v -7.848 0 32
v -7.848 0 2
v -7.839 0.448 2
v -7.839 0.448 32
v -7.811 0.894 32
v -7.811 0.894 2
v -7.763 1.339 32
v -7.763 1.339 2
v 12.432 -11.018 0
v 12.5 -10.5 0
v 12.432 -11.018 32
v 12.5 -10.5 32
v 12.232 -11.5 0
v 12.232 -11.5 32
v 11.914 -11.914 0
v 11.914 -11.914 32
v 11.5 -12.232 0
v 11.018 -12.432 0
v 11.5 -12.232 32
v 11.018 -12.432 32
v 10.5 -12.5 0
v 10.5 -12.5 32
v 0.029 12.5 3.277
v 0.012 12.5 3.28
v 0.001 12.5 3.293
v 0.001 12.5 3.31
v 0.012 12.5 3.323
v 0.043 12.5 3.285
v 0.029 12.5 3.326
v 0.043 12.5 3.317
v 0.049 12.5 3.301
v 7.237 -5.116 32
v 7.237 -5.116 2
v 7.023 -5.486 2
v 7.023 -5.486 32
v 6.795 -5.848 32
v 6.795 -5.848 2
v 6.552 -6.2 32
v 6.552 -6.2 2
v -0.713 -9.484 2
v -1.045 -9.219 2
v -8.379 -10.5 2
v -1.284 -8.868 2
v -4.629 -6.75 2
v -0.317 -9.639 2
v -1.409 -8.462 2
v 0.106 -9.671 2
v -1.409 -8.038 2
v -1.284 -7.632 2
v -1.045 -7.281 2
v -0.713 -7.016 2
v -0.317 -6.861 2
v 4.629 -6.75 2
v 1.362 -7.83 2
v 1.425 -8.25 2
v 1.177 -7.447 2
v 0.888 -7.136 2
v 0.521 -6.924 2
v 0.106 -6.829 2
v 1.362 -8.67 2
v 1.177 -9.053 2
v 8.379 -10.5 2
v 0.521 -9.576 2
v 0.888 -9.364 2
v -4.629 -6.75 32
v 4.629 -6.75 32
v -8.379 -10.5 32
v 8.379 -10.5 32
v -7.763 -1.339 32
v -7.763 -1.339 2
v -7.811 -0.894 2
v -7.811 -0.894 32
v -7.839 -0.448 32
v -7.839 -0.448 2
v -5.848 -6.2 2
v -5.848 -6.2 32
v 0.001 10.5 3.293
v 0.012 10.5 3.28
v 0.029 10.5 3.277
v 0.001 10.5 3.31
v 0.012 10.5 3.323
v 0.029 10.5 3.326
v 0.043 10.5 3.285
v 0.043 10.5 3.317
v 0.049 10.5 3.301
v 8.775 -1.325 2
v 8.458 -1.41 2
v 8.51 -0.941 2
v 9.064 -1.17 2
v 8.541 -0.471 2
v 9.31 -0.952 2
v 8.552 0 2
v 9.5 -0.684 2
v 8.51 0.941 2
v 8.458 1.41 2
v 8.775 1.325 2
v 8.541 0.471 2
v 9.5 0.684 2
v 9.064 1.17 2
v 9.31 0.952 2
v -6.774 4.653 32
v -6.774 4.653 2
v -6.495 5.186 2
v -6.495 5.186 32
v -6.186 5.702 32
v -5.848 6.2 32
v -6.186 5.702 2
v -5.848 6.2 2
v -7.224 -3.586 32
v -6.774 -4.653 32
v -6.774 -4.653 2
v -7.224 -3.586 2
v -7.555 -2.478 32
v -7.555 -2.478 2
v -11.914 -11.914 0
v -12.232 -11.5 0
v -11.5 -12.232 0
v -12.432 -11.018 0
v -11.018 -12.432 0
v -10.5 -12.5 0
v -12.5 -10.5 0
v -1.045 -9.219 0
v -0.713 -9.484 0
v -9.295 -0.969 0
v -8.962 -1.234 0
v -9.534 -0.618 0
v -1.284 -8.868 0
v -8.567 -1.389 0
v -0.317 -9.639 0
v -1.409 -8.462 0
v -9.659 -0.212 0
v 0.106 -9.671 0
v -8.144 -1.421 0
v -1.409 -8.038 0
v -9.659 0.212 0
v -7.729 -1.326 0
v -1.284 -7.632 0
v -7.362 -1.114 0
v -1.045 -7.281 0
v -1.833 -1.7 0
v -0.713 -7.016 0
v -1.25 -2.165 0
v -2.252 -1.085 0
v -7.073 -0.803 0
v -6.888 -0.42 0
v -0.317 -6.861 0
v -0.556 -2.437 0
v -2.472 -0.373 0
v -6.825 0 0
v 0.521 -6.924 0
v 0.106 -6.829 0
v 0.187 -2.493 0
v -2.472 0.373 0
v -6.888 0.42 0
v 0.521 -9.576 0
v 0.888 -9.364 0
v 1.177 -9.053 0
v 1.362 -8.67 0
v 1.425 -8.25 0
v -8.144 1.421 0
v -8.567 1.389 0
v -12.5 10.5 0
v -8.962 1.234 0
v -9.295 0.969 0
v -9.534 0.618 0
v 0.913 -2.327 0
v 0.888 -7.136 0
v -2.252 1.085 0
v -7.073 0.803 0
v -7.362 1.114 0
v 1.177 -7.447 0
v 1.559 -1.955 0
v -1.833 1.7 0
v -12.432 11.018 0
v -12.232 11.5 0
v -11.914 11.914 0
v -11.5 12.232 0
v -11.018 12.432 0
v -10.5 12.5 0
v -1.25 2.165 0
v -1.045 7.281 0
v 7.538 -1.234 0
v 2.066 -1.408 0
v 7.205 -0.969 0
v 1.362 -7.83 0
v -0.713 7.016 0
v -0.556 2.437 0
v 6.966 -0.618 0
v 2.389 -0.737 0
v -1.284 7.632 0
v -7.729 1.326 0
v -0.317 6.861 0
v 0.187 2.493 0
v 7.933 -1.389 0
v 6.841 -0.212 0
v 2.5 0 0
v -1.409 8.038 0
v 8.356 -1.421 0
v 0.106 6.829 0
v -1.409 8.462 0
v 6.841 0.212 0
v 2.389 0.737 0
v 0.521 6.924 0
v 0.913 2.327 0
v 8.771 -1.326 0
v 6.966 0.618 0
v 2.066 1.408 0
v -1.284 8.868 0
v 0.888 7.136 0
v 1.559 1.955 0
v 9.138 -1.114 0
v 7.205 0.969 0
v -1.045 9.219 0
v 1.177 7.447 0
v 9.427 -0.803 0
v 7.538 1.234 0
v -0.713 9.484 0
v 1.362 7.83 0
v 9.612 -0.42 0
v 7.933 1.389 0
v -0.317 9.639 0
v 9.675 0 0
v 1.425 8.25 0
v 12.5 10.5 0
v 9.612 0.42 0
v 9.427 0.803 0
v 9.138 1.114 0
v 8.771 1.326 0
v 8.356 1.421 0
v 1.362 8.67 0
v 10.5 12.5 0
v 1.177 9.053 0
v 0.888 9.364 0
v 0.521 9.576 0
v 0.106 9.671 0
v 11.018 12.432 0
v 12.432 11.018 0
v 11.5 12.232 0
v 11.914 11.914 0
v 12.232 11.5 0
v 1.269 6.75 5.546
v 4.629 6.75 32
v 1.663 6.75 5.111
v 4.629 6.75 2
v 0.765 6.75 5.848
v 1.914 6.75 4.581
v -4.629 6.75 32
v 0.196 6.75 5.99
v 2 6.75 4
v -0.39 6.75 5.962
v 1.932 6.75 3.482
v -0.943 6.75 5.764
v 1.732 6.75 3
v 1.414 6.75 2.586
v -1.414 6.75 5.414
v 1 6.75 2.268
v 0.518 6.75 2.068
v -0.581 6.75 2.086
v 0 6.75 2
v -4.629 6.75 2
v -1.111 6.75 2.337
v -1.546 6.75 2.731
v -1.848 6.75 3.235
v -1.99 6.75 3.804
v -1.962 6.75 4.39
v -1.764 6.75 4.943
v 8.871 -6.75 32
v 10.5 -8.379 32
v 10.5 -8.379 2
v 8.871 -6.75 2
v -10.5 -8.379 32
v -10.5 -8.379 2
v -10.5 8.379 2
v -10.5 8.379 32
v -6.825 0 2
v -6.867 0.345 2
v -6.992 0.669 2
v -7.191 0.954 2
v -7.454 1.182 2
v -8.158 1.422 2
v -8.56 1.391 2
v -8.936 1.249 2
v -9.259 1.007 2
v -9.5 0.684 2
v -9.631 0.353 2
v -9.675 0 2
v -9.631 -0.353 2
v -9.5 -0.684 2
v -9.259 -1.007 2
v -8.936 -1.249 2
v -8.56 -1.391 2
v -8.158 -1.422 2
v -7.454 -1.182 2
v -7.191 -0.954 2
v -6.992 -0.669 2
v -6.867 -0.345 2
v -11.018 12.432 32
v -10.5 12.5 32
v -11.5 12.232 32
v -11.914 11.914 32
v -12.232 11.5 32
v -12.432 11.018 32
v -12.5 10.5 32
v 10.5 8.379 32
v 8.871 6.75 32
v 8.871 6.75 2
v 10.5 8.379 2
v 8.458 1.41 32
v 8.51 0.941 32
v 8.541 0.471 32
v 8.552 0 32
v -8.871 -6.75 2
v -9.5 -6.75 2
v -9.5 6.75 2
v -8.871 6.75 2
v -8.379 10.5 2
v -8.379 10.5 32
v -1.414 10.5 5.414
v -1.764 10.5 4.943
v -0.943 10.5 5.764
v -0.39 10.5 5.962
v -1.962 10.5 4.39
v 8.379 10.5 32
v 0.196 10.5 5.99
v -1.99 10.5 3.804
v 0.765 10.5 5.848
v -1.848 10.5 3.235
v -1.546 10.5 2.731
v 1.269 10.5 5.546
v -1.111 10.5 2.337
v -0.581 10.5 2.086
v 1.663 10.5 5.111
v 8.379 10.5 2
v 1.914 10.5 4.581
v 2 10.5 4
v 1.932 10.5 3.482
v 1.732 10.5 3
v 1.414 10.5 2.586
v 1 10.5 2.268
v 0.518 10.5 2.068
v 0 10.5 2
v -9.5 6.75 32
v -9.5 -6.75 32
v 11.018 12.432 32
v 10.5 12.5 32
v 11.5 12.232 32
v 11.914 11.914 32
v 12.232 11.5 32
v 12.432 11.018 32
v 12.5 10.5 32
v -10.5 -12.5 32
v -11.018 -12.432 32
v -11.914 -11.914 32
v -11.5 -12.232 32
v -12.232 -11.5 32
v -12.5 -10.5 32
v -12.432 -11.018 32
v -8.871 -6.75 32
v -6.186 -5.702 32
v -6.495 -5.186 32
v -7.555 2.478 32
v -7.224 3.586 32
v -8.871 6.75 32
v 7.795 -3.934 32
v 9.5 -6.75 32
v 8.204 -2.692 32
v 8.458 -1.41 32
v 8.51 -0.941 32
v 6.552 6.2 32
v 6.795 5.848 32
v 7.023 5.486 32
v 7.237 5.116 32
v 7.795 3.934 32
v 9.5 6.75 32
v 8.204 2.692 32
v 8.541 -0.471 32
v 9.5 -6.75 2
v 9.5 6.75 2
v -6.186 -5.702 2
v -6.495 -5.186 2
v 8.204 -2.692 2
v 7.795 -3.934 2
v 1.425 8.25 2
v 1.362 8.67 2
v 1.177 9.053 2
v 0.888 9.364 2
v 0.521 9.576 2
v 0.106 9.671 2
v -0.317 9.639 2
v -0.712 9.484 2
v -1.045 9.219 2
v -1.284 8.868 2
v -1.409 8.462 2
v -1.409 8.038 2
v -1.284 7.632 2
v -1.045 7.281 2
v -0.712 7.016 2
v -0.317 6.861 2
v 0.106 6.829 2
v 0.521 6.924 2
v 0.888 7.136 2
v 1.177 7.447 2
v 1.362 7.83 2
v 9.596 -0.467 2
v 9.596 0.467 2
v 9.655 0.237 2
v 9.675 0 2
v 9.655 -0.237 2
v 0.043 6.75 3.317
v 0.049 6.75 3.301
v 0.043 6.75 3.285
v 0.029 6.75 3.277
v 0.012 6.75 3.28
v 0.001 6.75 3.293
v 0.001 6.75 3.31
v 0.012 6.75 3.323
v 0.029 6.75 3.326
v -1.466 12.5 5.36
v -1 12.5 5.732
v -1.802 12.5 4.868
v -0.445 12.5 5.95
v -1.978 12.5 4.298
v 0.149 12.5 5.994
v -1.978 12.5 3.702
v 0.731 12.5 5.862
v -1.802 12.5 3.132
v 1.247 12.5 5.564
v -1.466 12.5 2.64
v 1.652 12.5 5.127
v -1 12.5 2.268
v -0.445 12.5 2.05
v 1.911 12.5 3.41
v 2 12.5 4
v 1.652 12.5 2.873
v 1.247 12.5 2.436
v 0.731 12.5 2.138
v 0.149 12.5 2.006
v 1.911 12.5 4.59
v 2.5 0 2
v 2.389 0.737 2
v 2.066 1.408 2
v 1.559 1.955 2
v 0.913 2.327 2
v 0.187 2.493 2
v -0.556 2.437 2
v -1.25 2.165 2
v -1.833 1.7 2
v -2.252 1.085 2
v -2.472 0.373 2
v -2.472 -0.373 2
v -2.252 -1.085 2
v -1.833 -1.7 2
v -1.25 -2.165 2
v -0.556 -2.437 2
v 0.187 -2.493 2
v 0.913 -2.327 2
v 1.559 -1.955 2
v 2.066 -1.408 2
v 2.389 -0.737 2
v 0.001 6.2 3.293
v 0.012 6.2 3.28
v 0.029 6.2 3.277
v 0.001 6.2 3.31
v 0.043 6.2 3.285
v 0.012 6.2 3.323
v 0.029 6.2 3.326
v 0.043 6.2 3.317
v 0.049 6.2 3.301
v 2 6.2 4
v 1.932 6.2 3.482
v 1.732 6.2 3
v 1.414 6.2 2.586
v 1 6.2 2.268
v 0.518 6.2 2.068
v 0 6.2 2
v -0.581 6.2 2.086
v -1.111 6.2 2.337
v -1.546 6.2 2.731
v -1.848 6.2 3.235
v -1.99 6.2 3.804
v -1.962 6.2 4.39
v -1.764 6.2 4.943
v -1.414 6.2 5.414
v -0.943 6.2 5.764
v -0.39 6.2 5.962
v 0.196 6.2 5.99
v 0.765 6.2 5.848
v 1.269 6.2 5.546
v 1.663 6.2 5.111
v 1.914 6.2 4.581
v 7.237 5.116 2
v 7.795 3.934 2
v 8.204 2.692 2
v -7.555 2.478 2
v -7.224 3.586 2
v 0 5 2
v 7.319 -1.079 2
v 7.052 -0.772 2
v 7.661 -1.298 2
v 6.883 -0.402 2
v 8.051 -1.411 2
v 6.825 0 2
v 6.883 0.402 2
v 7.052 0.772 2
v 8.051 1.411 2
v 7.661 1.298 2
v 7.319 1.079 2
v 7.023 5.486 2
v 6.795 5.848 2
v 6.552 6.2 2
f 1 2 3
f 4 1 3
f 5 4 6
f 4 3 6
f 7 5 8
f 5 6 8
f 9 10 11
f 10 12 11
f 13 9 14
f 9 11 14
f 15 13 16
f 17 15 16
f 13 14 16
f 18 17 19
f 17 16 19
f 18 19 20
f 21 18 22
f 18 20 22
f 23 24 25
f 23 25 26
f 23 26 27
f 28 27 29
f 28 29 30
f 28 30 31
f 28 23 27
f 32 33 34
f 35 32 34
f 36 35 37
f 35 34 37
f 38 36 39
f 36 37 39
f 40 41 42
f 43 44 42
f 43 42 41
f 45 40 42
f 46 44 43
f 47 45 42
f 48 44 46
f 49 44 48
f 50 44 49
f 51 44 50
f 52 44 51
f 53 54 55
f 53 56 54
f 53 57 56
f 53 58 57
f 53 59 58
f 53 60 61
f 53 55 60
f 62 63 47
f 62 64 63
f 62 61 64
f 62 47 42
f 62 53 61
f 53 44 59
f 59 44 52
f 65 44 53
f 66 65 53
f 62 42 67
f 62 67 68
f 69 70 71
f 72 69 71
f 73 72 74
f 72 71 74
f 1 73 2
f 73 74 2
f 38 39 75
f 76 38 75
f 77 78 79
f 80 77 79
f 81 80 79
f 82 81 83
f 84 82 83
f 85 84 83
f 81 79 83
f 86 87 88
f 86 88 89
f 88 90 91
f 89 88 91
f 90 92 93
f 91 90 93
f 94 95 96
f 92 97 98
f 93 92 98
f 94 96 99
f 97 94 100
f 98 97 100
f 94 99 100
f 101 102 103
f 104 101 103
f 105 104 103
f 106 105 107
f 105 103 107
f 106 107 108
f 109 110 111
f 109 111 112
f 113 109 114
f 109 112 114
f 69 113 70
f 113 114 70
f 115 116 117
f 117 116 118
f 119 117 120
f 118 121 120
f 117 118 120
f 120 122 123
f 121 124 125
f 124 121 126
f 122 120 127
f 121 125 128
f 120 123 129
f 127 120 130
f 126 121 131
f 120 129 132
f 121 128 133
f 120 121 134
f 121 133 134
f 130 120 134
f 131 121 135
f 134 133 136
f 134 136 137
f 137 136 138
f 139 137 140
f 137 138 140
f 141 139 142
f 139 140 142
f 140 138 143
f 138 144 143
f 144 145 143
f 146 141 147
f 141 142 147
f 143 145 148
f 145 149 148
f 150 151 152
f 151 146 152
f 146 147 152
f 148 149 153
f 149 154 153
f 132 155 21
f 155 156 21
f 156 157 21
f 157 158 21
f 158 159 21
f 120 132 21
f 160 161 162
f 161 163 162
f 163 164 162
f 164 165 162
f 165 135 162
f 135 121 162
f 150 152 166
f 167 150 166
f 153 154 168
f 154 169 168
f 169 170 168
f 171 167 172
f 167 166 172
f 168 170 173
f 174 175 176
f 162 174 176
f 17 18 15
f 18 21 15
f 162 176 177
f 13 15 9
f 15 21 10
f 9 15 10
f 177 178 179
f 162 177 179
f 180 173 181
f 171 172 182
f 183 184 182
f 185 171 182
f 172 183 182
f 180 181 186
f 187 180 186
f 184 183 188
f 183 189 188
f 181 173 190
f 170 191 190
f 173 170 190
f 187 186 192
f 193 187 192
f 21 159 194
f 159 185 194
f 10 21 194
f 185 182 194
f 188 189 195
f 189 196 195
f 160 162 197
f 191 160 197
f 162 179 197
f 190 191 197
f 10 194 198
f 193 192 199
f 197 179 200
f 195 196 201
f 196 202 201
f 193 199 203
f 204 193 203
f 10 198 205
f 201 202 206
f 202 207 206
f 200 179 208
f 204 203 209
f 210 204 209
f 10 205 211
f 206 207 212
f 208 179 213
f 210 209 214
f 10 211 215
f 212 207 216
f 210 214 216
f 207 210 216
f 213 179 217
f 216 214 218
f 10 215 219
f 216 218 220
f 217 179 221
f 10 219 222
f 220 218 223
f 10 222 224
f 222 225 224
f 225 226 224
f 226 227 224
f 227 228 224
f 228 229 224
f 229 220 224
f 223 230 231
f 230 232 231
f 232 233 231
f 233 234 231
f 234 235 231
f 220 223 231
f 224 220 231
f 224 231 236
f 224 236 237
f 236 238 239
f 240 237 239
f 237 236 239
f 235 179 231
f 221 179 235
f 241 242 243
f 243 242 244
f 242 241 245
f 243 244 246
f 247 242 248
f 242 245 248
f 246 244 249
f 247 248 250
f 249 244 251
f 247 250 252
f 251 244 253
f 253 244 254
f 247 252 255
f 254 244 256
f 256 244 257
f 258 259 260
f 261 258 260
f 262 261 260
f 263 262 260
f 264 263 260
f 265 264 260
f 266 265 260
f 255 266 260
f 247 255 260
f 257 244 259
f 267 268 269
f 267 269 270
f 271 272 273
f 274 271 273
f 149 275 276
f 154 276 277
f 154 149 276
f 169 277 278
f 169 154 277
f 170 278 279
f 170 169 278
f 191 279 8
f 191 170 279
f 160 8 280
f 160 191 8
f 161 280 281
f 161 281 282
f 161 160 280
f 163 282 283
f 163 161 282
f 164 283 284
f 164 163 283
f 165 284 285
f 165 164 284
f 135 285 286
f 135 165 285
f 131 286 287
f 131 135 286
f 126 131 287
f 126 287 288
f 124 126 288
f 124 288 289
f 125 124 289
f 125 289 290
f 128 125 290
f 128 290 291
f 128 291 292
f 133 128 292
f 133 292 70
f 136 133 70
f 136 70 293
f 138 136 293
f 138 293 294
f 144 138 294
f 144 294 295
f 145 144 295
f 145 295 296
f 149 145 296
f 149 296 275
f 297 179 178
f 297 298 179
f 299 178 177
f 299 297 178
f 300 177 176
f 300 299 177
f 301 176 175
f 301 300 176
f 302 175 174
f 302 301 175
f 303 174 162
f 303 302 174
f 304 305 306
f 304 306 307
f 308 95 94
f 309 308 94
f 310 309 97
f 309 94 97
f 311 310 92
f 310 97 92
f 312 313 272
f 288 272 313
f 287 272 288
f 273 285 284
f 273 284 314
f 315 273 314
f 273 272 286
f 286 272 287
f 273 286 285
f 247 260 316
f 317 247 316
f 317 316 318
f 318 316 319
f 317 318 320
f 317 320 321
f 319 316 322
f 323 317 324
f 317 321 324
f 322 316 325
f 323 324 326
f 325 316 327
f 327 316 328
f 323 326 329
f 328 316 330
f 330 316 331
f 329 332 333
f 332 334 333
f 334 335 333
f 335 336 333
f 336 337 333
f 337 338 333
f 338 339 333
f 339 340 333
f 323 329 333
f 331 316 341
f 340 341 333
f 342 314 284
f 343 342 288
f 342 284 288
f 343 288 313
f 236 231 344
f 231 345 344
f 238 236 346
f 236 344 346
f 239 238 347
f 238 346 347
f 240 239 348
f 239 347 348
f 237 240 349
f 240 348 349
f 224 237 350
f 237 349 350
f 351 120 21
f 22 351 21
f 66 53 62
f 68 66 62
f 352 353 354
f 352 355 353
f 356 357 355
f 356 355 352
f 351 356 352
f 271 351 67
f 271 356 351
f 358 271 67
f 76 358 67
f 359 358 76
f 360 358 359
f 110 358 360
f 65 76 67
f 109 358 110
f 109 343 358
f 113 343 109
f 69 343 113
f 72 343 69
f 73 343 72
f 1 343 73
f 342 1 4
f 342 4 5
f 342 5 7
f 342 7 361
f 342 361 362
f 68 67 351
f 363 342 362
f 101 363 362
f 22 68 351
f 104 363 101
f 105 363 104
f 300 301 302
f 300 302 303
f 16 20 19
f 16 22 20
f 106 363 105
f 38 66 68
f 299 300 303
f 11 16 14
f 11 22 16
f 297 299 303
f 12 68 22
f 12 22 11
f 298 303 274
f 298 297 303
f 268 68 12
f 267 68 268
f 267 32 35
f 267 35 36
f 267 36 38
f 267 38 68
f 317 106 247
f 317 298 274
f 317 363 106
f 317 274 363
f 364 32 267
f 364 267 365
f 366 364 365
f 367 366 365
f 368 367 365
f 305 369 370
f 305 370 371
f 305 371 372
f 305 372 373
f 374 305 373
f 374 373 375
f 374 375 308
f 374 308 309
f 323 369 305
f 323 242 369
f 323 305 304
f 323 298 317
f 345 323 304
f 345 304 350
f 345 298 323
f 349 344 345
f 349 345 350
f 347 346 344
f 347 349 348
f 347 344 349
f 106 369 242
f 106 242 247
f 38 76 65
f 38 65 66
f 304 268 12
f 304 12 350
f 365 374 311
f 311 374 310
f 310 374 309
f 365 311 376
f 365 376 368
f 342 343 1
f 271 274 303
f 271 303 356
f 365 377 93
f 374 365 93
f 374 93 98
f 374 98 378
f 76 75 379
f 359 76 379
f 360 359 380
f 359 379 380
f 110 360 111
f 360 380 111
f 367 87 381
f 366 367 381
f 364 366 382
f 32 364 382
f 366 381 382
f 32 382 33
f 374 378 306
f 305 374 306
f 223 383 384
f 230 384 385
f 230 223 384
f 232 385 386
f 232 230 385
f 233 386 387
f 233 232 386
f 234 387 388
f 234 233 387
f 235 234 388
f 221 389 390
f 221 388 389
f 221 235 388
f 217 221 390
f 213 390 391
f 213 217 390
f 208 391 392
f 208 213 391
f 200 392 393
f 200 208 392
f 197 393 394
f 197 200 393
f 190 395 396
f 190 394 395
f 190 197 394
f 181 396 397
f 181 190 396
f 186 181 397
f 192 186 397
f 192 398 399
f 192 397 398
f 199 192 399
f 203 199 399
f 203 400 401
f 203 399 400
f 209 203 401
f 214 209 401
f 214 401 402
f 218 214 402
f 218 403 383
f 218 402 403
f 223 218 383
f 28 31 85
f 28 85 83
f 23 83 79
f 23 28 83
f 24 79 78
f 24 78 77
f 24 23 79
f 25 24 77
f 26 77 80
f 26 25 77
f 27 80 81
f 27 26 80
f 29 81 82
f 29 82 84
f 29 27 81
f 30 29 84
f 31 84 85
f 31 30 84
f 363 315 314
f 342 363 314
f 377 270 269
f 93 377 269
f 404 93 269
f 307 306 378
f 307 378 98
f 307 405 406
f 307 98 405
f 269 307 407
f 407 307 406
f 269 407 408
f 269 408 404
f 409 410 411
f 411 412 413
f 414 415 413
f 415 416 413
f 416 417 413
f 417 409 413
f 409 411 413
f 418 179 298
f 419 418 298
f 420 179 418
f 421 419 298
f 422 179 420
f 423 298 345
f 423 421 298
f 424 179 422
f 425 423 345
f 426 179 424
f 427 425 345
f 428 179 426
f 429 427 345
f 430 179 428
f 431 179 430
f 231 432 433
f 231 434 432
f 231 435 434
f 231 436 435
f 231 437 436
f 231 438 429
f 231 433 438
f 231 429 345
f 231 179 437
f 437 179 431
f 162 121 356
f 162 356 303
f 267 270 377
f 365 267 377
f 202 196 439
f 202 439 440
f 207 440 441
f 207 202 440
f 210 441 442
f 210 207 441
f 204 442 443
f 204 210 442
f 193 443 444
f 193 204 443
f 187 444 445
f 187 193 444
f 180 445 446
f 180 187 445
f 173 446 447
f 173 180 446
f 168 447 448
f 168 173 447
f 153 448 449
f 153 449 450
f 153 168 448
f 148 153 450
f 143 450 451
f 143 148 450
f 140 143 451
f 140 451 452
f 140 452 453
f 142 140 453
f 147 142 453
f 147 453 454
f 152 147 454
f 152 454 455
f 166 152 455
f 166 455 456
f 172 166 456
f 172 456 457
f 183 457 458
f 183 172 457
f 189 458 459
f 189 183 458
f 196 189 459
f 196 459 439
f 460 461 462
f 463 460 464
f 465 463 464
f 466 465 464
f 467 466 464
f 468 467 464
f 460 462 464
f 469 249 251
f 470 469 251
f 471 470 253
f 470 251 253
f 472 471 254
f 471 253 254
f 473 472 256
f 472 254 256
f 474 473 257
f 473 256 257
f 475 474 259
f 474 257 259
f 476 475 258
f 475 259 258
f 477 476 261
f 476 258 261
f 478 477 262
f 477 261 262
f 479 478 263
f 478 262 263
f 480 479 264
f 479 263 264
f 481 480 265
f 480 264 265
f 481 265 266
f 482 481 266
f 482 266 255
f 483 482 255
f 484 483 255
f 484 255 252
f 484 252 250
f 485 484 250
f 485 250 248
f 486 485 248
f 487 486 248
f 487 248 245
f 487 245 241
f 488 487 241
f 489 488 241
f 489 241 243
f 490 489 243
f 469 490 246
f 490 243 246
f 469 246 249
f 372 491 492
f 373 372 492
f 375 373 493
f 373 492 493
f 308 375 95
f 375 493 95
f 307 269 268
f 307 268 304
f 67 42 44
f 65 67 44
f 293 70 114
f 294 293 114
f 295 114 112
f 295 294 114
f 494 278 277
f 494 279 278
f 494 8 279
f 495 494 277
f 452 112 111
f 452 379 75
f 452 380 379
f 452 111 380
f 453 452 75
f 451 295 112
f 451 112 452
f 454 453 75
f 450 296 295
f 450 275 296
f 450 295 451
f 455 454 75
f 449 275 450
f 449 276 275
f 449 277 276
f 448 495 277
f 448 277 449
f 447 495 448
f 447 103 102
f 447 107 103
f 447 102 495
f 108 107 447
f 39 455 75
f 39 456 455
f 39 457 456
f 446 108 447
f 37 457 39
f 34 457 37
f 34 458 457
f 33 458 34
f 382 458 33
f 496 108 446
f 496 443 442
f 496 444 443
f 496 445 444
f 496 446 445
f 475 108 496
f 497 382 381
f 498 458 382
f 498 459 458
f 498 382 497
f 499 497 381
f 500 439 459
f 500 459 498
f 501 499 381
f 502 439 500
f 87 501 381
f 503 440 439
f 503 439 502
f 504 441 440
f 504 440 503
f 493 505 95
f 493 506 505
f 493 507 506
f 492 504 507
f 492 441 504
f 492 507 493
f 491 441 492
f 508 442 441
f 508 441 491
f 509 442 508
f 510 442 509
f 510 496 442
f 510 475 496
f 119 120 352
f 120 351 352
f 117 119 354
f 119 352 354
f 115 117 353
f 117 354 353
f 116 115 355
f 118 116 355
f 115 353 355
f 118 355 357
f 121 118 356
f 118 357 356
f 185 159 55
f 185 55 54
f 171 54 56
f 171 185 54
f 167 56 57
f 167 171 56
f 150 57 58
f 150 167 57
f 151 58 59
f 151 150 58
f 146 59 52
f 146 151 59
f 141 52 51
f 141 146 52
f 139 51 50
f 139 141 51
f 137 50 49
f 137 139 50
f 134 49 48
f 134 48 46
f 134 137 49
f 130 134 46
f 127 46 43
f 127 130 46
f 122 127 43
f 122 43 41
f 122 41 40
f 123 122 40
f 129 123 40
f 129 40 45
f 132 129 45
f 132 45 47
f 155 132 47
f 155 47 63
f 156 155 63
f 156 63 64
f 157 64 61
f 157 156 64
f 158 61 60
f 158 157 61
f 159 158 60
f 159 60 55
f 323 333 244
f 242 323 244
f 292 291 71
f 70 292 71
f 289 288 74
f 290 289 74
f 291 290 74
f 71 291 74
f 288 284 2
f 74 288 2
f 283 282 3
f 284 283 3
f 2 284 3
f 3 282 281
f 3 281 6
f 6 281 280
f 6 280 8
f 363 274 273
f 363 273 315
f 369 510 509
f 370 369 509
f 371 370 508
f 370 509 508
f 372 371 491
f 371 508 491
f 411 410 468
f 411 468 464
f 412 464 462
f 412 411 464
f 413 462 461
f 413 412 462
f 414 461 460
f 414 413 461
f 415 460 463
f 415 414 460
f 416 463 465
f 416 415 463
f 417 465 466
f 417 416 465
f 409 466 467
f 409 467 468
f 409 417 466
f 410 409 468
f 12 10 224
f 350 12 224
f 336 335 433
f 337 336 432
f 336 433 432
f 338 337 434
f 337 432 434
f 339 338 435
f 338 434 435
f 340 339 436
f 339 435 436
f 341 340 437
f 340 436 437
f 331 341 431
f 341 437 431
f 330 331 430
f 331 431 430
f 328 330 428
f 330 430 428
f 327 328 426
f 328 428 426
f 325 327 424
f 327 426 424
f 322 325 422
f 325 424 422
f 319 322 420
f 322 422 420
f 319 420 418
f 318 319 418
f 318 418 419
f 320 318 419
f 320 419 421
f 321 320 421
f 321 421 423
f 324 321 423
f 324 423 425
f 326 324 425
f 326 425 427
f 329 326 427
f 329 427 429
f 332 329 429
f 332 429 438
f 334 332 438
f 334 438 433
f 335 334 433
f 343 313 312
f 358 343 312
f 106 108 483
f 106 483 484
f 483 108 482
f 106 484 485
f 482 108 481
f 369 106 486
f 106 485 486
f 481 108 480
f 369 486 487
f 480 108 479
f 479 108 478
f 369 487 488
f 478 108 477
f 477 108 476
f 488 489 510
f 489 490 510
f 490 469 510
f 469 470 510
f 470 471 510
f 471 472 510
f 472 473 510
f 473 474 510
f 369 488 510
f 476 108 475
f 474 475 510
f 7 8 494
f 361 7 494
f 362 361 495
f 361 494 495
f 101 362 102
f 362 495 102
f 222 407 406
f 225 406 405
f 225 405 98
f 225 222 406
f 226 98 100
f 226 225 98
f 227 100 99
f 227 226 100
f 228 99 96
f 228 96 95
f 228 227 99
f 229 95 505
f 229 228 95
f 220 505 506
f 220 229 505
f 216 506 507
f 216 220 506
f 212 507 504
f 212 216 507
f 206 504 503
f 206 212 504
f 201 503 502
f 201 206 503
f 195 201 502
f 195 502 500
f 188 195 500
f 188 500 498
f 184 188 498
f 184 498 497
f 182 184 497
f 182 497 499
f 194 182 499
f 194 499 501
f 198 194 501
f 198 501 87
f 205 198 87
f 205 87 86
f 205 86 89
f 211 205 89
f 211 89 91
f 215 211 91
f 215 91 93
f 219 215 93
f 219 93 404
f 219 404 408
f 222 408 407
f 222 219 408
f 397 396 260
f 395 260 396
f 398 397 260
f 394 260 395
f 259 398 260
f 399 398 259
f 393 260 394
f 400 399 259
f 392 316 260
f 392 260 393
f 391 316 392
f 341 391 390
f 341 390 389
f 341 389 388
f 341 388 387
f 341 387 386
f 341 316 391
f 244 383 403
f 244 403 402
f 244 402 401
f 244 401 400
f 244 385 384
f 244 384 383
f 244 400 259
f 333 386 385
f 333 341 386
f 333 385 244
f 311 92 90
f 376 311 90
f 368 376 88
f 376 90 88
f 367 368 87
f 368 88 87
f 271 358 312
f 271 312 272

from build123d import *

# Parameters (mm, degrees)
SKETCH1_W           = 25
SKETCH1_H           = 25
BOSS_EXTRUDE1_DEPTH = 32
SHELL1_T            = -2
SKETCH2_R           = 2.5
SKETCH2_R_2         = 1.425
CUT_EXTRUDE4_DEPTH  = 2
BOSS_EXTRUDE3_DEPTH = 30
SKETCH5_R           = 2
SKETCH5_R_2         = 0.024622166
CUT_EXTRUDE6_DEPTH  = 7.5
FILLET1_R           = 2


with BuildPart() as part:
    # Sketch1 → Boss-Extrude1 (new body)
    with BuildSketch(Plane.XY):
        Rectangle(SKETCH1_W, SKETCH1_H)
    extrude(amount=BOSS_EXTRUDE1_DEPTH)

    # Shell1
    shell1_openings = [part.faces().sort_by_distance(p)[0] for p in [
        (0, 0, 32),
    ]]
    offset(amount=SHELL1_T, openings=shell1_openings, kind=Kind.INTERSECTION)

    # Sketch2 → Cut-Extrude4 (cut)
    with BuildSketch(Plane.XY):
        Circle(SKETCH2_R)
        with Locations((8.25, 0)):
            Circle(SKETCH2_R_2)
        with Locations((0, -8.25)):
            Circle(SKETCH2_R_2)
        with Locations((-8.25, 0)):
            Circle(SKETCH2_R_2)
        with Locations((0, 8.25)):
            Circle(SKETCH2_R_2)
    extrude(amount=CUT_EXTRUDE4_DEPTH, mode=Mode.SUBTRACT)

    # Sketch4 → Boss-Extrude3 (add)
    with BuildSketch(Plane.XY.offset(2)):
        with BuildLine():
            Line((-8.871320344, 6.75), (-6.773867463, 4.652547119))
            ThreePointArc((-6.773867463, 4.652547119), (-6.344045672, 5.445969686), (-5.848359857, 6.2))
            Line((-5.848359857, 6.2), (-4.078679656, 6.2))
            Line((-4.078679656, 6.2), (-4.628679656, 6.75))
            Line((-4.628679656, 6.75), (-8.871320344, 6.75))
        make_face()
        Polygon((-10.5, 8.378679656), (-8.871320344, 6.75), (-4.628679656, 6.75), (-8.378679656, 10.5), (-10.5, 10.5), align=None)
        Polygon((-4.628679656, 6.75), (-4.078679656, 6.2), (0.351640143, 6.2), (4.078679656, 6.2), (4.628679656, 6.75), align=None)
        Polygon((4.628679656, 6.75), (8.871320344, 6.75), (10.5, 8.378679656), (10.5, 10.5), (8.378679656, 10.5), align=None)
        with BuildLine():
            ThreePointArc((6.551640143, 6.2), (6.91069206, 5.668174991), (7.236937783, 5.11561744))
            Line((7.236937783, 5.11561744), (8.871320344, 6.75))
            Line((8.871320344, 6.75), (4.628679656, 6.75))
            Line((4.628679656, 6.75), (4.078679656, 6.2))
            Line((4.078679656, 6.2), (6.551640143, 6.2))
        make_face()
        with BuildLine():
            ThreePointArc((-5.848359857, -6.2), (-6.344045672, -5.445969686), (-6.773867463, -4.652547119))
            Line((-6.773867463, -4.652547119), (-8.871320344, -6.75))
            Line((-8.871320344, -6.75), (-4.628679656, -6.75))
            Line((-4.628679656, -6.75), (-4.078679656, -6.2))
            Line((-4.078679656, -6.2), (-5.848359857, -6.2))
        make_face()
        with BuildLine():
            Line((8.871320344, -6.75), (7.236937783, -5.11561744))
            ThreePointArc((7.236937783, -5.11561744), (6.91069206, -5.668174991), (6.551640143, -6.2))
            Line((6.551640143, -6.2), (4.078679656, -6.2))
            Line((4.078679656, -6.2), (4.628679656, -6.75))
            Line((4.628679656, -6.75), (8.871320344, -6.75))
        make_face()
        Polygon((-4.628679656, -6.75), (-8.871320344, -6.75), (-10.5, -8.378679656), (-10.5, -10.5), (-8.378679656, -10.5), align=None)
        Polygon((10.5, -8.378679656), (8.871320344, -6.75), (4.628679656, -6.75), (8.378679656, -10.5), (10.5, -10.5), align=None)
        with BuildLine():
            Line((8.871320344, 6.75), (7.236937783, 5.11561744))
            ThreePointArc((7.236937783, 5.11561744), (8.019057631, 3.319300647), (8.457559307, 1.409802871))
            ThreePointArc((8.457559307, 1.409802871), (9.064092068, 1.169563639), (9.5, 0.684196609))
            Line((9.5, 0.684196609), (9.5, 6.75))
            Line((9.5, 6.75), (8.871320344, 6.75))
        make_face()
        with BuildLine():
            ThreePointArc((8.457559307, -1.409802871), (8.019057631, -3.319300647), (7.236937783, -5.11561744))
            Line((7.236937783, -5.11561744), (8.871320344, -6.75))
            Line((8.871320344, -6.75), (9.5, -6.75))
            Line((9.5, -6.75), (9.5, -0.684196609))
            ThreePointArc((9.5, -0.684196609), (9.064092068, -1.169563639), (8.457559307, -1.409802871))
        make_face()
        Polygon((0.351640143, -6.2), (-4.078679656, -6.2), (-4.628679656, -6.75), (4.628679656, -6.75), (4.078679656, -6.2), align=None)
        with BuildLine():
            ThreePointArc((-6.773867463, -4.652547119), (-7.404553087, -3.03654659), (-7.76348103, -1.33937459))
            ThreePointArc((-7.76348103, -1.33937459), (-8.753031179, -1.333260902), (-9.5, -0.684196609))
            Line((-9.5, -0.684196609), (-9.5, -6.75))
            Line((-9.5, -6.75), (-8.871320344, -6.75))
            Line((-8.871320344, -6.75), (-6.773867463, -4.652547119))
        make_face()
        with BuildLine():
            ThreePointArc((-9.5, 0.684196609), (-8.753031179, 1.333260902), (-7.76348103, 1.33937459))
            ThreePointArc((-7.76348103, 1.33937459), (-7.404553087, 3.03654659), (-6.773867463, 4.652547119))
            Line((-6.773867463, 4.652547119), (-8.871320344, 6.75))
            Line((-8.871320344, 6.75), (-9.5, 6.75))
            Line((-9.5, 6.75), (-9.5, 0.684196609))
        make_face()
        with BuildLine():
            ThreePointArc((-7.76348103, -1.33937459), (-7.827118888, -0.671030682), (-7.848359857, 0))
            ThreePointArc((-7.848359857, 0), (-7.827118888, 0.671030682), (-7.76348103, 1.33937459))
            ThreePointArc((-7.76348103, 1.33937459), (-8.753031179, 1.333260902), (-9.5, 0.684196609))
            Line((-9.5, 0.684196609), (-9.5, -0.684196609))
            ThreePointArc((-9.5, -0.684196609), (-8.753031179, -1.333260902), (-7.76348103, -1.33937459))
        make_face()
        with BuildLine():
            ThreePointArc((8.457559307, 1.409802871), (8.528093807, 0.706469273), (8.551640143, 0))
            ThreePointArc((8.551640143, 0), (8.528093807, -0.706469273), (8.457559307, -1.409802871))
            ThreePointArc((8.457559307, -1.409802871), (9.064092068, -1.169563639), (9.5, -0.684196609))
            Line((9.5, -0.684196609), (9.5, 0.684196609))
            ThreePointArc((9.5, 0.684196609), (9.064092068, 1.169563639), (8.457559307, 1.409802871))
        make_face()
    extrude(amount=BOSS_EXTRUDE3_DEPTH)

    # Sketch5 → Cut-Extrude6 (cut)
    with BuildSketch(Plane(origin=(0, 12.5, 0), x_dir=(1, 0, 0), z_dir=(0, 1, 0))):
        with Locations((0, -4)):
            Circle(SKETCH5_R)
        with Locations((0.024622166, -3.301323142)):
            Circle(SKETCH5_R_2, mode=Mode.SUBTRACT)
    extrude(amount=-CUT_EXTRUDE6_DEPTH, mode=Mode.SUBTRACT)

    # Fillet1
    fillet1_edges = [part.edges().sort_by_distance(p)[0] for p in [
        (12.5, -12.5, 16),
        (12.5, 12.5, 16),
        (-12.5, 12.5, 16),
        (-12.5, -12.5, 16),
    ]]
    fillet(fillet1_edges, radius=FILLET1_R)


solid = part.part
